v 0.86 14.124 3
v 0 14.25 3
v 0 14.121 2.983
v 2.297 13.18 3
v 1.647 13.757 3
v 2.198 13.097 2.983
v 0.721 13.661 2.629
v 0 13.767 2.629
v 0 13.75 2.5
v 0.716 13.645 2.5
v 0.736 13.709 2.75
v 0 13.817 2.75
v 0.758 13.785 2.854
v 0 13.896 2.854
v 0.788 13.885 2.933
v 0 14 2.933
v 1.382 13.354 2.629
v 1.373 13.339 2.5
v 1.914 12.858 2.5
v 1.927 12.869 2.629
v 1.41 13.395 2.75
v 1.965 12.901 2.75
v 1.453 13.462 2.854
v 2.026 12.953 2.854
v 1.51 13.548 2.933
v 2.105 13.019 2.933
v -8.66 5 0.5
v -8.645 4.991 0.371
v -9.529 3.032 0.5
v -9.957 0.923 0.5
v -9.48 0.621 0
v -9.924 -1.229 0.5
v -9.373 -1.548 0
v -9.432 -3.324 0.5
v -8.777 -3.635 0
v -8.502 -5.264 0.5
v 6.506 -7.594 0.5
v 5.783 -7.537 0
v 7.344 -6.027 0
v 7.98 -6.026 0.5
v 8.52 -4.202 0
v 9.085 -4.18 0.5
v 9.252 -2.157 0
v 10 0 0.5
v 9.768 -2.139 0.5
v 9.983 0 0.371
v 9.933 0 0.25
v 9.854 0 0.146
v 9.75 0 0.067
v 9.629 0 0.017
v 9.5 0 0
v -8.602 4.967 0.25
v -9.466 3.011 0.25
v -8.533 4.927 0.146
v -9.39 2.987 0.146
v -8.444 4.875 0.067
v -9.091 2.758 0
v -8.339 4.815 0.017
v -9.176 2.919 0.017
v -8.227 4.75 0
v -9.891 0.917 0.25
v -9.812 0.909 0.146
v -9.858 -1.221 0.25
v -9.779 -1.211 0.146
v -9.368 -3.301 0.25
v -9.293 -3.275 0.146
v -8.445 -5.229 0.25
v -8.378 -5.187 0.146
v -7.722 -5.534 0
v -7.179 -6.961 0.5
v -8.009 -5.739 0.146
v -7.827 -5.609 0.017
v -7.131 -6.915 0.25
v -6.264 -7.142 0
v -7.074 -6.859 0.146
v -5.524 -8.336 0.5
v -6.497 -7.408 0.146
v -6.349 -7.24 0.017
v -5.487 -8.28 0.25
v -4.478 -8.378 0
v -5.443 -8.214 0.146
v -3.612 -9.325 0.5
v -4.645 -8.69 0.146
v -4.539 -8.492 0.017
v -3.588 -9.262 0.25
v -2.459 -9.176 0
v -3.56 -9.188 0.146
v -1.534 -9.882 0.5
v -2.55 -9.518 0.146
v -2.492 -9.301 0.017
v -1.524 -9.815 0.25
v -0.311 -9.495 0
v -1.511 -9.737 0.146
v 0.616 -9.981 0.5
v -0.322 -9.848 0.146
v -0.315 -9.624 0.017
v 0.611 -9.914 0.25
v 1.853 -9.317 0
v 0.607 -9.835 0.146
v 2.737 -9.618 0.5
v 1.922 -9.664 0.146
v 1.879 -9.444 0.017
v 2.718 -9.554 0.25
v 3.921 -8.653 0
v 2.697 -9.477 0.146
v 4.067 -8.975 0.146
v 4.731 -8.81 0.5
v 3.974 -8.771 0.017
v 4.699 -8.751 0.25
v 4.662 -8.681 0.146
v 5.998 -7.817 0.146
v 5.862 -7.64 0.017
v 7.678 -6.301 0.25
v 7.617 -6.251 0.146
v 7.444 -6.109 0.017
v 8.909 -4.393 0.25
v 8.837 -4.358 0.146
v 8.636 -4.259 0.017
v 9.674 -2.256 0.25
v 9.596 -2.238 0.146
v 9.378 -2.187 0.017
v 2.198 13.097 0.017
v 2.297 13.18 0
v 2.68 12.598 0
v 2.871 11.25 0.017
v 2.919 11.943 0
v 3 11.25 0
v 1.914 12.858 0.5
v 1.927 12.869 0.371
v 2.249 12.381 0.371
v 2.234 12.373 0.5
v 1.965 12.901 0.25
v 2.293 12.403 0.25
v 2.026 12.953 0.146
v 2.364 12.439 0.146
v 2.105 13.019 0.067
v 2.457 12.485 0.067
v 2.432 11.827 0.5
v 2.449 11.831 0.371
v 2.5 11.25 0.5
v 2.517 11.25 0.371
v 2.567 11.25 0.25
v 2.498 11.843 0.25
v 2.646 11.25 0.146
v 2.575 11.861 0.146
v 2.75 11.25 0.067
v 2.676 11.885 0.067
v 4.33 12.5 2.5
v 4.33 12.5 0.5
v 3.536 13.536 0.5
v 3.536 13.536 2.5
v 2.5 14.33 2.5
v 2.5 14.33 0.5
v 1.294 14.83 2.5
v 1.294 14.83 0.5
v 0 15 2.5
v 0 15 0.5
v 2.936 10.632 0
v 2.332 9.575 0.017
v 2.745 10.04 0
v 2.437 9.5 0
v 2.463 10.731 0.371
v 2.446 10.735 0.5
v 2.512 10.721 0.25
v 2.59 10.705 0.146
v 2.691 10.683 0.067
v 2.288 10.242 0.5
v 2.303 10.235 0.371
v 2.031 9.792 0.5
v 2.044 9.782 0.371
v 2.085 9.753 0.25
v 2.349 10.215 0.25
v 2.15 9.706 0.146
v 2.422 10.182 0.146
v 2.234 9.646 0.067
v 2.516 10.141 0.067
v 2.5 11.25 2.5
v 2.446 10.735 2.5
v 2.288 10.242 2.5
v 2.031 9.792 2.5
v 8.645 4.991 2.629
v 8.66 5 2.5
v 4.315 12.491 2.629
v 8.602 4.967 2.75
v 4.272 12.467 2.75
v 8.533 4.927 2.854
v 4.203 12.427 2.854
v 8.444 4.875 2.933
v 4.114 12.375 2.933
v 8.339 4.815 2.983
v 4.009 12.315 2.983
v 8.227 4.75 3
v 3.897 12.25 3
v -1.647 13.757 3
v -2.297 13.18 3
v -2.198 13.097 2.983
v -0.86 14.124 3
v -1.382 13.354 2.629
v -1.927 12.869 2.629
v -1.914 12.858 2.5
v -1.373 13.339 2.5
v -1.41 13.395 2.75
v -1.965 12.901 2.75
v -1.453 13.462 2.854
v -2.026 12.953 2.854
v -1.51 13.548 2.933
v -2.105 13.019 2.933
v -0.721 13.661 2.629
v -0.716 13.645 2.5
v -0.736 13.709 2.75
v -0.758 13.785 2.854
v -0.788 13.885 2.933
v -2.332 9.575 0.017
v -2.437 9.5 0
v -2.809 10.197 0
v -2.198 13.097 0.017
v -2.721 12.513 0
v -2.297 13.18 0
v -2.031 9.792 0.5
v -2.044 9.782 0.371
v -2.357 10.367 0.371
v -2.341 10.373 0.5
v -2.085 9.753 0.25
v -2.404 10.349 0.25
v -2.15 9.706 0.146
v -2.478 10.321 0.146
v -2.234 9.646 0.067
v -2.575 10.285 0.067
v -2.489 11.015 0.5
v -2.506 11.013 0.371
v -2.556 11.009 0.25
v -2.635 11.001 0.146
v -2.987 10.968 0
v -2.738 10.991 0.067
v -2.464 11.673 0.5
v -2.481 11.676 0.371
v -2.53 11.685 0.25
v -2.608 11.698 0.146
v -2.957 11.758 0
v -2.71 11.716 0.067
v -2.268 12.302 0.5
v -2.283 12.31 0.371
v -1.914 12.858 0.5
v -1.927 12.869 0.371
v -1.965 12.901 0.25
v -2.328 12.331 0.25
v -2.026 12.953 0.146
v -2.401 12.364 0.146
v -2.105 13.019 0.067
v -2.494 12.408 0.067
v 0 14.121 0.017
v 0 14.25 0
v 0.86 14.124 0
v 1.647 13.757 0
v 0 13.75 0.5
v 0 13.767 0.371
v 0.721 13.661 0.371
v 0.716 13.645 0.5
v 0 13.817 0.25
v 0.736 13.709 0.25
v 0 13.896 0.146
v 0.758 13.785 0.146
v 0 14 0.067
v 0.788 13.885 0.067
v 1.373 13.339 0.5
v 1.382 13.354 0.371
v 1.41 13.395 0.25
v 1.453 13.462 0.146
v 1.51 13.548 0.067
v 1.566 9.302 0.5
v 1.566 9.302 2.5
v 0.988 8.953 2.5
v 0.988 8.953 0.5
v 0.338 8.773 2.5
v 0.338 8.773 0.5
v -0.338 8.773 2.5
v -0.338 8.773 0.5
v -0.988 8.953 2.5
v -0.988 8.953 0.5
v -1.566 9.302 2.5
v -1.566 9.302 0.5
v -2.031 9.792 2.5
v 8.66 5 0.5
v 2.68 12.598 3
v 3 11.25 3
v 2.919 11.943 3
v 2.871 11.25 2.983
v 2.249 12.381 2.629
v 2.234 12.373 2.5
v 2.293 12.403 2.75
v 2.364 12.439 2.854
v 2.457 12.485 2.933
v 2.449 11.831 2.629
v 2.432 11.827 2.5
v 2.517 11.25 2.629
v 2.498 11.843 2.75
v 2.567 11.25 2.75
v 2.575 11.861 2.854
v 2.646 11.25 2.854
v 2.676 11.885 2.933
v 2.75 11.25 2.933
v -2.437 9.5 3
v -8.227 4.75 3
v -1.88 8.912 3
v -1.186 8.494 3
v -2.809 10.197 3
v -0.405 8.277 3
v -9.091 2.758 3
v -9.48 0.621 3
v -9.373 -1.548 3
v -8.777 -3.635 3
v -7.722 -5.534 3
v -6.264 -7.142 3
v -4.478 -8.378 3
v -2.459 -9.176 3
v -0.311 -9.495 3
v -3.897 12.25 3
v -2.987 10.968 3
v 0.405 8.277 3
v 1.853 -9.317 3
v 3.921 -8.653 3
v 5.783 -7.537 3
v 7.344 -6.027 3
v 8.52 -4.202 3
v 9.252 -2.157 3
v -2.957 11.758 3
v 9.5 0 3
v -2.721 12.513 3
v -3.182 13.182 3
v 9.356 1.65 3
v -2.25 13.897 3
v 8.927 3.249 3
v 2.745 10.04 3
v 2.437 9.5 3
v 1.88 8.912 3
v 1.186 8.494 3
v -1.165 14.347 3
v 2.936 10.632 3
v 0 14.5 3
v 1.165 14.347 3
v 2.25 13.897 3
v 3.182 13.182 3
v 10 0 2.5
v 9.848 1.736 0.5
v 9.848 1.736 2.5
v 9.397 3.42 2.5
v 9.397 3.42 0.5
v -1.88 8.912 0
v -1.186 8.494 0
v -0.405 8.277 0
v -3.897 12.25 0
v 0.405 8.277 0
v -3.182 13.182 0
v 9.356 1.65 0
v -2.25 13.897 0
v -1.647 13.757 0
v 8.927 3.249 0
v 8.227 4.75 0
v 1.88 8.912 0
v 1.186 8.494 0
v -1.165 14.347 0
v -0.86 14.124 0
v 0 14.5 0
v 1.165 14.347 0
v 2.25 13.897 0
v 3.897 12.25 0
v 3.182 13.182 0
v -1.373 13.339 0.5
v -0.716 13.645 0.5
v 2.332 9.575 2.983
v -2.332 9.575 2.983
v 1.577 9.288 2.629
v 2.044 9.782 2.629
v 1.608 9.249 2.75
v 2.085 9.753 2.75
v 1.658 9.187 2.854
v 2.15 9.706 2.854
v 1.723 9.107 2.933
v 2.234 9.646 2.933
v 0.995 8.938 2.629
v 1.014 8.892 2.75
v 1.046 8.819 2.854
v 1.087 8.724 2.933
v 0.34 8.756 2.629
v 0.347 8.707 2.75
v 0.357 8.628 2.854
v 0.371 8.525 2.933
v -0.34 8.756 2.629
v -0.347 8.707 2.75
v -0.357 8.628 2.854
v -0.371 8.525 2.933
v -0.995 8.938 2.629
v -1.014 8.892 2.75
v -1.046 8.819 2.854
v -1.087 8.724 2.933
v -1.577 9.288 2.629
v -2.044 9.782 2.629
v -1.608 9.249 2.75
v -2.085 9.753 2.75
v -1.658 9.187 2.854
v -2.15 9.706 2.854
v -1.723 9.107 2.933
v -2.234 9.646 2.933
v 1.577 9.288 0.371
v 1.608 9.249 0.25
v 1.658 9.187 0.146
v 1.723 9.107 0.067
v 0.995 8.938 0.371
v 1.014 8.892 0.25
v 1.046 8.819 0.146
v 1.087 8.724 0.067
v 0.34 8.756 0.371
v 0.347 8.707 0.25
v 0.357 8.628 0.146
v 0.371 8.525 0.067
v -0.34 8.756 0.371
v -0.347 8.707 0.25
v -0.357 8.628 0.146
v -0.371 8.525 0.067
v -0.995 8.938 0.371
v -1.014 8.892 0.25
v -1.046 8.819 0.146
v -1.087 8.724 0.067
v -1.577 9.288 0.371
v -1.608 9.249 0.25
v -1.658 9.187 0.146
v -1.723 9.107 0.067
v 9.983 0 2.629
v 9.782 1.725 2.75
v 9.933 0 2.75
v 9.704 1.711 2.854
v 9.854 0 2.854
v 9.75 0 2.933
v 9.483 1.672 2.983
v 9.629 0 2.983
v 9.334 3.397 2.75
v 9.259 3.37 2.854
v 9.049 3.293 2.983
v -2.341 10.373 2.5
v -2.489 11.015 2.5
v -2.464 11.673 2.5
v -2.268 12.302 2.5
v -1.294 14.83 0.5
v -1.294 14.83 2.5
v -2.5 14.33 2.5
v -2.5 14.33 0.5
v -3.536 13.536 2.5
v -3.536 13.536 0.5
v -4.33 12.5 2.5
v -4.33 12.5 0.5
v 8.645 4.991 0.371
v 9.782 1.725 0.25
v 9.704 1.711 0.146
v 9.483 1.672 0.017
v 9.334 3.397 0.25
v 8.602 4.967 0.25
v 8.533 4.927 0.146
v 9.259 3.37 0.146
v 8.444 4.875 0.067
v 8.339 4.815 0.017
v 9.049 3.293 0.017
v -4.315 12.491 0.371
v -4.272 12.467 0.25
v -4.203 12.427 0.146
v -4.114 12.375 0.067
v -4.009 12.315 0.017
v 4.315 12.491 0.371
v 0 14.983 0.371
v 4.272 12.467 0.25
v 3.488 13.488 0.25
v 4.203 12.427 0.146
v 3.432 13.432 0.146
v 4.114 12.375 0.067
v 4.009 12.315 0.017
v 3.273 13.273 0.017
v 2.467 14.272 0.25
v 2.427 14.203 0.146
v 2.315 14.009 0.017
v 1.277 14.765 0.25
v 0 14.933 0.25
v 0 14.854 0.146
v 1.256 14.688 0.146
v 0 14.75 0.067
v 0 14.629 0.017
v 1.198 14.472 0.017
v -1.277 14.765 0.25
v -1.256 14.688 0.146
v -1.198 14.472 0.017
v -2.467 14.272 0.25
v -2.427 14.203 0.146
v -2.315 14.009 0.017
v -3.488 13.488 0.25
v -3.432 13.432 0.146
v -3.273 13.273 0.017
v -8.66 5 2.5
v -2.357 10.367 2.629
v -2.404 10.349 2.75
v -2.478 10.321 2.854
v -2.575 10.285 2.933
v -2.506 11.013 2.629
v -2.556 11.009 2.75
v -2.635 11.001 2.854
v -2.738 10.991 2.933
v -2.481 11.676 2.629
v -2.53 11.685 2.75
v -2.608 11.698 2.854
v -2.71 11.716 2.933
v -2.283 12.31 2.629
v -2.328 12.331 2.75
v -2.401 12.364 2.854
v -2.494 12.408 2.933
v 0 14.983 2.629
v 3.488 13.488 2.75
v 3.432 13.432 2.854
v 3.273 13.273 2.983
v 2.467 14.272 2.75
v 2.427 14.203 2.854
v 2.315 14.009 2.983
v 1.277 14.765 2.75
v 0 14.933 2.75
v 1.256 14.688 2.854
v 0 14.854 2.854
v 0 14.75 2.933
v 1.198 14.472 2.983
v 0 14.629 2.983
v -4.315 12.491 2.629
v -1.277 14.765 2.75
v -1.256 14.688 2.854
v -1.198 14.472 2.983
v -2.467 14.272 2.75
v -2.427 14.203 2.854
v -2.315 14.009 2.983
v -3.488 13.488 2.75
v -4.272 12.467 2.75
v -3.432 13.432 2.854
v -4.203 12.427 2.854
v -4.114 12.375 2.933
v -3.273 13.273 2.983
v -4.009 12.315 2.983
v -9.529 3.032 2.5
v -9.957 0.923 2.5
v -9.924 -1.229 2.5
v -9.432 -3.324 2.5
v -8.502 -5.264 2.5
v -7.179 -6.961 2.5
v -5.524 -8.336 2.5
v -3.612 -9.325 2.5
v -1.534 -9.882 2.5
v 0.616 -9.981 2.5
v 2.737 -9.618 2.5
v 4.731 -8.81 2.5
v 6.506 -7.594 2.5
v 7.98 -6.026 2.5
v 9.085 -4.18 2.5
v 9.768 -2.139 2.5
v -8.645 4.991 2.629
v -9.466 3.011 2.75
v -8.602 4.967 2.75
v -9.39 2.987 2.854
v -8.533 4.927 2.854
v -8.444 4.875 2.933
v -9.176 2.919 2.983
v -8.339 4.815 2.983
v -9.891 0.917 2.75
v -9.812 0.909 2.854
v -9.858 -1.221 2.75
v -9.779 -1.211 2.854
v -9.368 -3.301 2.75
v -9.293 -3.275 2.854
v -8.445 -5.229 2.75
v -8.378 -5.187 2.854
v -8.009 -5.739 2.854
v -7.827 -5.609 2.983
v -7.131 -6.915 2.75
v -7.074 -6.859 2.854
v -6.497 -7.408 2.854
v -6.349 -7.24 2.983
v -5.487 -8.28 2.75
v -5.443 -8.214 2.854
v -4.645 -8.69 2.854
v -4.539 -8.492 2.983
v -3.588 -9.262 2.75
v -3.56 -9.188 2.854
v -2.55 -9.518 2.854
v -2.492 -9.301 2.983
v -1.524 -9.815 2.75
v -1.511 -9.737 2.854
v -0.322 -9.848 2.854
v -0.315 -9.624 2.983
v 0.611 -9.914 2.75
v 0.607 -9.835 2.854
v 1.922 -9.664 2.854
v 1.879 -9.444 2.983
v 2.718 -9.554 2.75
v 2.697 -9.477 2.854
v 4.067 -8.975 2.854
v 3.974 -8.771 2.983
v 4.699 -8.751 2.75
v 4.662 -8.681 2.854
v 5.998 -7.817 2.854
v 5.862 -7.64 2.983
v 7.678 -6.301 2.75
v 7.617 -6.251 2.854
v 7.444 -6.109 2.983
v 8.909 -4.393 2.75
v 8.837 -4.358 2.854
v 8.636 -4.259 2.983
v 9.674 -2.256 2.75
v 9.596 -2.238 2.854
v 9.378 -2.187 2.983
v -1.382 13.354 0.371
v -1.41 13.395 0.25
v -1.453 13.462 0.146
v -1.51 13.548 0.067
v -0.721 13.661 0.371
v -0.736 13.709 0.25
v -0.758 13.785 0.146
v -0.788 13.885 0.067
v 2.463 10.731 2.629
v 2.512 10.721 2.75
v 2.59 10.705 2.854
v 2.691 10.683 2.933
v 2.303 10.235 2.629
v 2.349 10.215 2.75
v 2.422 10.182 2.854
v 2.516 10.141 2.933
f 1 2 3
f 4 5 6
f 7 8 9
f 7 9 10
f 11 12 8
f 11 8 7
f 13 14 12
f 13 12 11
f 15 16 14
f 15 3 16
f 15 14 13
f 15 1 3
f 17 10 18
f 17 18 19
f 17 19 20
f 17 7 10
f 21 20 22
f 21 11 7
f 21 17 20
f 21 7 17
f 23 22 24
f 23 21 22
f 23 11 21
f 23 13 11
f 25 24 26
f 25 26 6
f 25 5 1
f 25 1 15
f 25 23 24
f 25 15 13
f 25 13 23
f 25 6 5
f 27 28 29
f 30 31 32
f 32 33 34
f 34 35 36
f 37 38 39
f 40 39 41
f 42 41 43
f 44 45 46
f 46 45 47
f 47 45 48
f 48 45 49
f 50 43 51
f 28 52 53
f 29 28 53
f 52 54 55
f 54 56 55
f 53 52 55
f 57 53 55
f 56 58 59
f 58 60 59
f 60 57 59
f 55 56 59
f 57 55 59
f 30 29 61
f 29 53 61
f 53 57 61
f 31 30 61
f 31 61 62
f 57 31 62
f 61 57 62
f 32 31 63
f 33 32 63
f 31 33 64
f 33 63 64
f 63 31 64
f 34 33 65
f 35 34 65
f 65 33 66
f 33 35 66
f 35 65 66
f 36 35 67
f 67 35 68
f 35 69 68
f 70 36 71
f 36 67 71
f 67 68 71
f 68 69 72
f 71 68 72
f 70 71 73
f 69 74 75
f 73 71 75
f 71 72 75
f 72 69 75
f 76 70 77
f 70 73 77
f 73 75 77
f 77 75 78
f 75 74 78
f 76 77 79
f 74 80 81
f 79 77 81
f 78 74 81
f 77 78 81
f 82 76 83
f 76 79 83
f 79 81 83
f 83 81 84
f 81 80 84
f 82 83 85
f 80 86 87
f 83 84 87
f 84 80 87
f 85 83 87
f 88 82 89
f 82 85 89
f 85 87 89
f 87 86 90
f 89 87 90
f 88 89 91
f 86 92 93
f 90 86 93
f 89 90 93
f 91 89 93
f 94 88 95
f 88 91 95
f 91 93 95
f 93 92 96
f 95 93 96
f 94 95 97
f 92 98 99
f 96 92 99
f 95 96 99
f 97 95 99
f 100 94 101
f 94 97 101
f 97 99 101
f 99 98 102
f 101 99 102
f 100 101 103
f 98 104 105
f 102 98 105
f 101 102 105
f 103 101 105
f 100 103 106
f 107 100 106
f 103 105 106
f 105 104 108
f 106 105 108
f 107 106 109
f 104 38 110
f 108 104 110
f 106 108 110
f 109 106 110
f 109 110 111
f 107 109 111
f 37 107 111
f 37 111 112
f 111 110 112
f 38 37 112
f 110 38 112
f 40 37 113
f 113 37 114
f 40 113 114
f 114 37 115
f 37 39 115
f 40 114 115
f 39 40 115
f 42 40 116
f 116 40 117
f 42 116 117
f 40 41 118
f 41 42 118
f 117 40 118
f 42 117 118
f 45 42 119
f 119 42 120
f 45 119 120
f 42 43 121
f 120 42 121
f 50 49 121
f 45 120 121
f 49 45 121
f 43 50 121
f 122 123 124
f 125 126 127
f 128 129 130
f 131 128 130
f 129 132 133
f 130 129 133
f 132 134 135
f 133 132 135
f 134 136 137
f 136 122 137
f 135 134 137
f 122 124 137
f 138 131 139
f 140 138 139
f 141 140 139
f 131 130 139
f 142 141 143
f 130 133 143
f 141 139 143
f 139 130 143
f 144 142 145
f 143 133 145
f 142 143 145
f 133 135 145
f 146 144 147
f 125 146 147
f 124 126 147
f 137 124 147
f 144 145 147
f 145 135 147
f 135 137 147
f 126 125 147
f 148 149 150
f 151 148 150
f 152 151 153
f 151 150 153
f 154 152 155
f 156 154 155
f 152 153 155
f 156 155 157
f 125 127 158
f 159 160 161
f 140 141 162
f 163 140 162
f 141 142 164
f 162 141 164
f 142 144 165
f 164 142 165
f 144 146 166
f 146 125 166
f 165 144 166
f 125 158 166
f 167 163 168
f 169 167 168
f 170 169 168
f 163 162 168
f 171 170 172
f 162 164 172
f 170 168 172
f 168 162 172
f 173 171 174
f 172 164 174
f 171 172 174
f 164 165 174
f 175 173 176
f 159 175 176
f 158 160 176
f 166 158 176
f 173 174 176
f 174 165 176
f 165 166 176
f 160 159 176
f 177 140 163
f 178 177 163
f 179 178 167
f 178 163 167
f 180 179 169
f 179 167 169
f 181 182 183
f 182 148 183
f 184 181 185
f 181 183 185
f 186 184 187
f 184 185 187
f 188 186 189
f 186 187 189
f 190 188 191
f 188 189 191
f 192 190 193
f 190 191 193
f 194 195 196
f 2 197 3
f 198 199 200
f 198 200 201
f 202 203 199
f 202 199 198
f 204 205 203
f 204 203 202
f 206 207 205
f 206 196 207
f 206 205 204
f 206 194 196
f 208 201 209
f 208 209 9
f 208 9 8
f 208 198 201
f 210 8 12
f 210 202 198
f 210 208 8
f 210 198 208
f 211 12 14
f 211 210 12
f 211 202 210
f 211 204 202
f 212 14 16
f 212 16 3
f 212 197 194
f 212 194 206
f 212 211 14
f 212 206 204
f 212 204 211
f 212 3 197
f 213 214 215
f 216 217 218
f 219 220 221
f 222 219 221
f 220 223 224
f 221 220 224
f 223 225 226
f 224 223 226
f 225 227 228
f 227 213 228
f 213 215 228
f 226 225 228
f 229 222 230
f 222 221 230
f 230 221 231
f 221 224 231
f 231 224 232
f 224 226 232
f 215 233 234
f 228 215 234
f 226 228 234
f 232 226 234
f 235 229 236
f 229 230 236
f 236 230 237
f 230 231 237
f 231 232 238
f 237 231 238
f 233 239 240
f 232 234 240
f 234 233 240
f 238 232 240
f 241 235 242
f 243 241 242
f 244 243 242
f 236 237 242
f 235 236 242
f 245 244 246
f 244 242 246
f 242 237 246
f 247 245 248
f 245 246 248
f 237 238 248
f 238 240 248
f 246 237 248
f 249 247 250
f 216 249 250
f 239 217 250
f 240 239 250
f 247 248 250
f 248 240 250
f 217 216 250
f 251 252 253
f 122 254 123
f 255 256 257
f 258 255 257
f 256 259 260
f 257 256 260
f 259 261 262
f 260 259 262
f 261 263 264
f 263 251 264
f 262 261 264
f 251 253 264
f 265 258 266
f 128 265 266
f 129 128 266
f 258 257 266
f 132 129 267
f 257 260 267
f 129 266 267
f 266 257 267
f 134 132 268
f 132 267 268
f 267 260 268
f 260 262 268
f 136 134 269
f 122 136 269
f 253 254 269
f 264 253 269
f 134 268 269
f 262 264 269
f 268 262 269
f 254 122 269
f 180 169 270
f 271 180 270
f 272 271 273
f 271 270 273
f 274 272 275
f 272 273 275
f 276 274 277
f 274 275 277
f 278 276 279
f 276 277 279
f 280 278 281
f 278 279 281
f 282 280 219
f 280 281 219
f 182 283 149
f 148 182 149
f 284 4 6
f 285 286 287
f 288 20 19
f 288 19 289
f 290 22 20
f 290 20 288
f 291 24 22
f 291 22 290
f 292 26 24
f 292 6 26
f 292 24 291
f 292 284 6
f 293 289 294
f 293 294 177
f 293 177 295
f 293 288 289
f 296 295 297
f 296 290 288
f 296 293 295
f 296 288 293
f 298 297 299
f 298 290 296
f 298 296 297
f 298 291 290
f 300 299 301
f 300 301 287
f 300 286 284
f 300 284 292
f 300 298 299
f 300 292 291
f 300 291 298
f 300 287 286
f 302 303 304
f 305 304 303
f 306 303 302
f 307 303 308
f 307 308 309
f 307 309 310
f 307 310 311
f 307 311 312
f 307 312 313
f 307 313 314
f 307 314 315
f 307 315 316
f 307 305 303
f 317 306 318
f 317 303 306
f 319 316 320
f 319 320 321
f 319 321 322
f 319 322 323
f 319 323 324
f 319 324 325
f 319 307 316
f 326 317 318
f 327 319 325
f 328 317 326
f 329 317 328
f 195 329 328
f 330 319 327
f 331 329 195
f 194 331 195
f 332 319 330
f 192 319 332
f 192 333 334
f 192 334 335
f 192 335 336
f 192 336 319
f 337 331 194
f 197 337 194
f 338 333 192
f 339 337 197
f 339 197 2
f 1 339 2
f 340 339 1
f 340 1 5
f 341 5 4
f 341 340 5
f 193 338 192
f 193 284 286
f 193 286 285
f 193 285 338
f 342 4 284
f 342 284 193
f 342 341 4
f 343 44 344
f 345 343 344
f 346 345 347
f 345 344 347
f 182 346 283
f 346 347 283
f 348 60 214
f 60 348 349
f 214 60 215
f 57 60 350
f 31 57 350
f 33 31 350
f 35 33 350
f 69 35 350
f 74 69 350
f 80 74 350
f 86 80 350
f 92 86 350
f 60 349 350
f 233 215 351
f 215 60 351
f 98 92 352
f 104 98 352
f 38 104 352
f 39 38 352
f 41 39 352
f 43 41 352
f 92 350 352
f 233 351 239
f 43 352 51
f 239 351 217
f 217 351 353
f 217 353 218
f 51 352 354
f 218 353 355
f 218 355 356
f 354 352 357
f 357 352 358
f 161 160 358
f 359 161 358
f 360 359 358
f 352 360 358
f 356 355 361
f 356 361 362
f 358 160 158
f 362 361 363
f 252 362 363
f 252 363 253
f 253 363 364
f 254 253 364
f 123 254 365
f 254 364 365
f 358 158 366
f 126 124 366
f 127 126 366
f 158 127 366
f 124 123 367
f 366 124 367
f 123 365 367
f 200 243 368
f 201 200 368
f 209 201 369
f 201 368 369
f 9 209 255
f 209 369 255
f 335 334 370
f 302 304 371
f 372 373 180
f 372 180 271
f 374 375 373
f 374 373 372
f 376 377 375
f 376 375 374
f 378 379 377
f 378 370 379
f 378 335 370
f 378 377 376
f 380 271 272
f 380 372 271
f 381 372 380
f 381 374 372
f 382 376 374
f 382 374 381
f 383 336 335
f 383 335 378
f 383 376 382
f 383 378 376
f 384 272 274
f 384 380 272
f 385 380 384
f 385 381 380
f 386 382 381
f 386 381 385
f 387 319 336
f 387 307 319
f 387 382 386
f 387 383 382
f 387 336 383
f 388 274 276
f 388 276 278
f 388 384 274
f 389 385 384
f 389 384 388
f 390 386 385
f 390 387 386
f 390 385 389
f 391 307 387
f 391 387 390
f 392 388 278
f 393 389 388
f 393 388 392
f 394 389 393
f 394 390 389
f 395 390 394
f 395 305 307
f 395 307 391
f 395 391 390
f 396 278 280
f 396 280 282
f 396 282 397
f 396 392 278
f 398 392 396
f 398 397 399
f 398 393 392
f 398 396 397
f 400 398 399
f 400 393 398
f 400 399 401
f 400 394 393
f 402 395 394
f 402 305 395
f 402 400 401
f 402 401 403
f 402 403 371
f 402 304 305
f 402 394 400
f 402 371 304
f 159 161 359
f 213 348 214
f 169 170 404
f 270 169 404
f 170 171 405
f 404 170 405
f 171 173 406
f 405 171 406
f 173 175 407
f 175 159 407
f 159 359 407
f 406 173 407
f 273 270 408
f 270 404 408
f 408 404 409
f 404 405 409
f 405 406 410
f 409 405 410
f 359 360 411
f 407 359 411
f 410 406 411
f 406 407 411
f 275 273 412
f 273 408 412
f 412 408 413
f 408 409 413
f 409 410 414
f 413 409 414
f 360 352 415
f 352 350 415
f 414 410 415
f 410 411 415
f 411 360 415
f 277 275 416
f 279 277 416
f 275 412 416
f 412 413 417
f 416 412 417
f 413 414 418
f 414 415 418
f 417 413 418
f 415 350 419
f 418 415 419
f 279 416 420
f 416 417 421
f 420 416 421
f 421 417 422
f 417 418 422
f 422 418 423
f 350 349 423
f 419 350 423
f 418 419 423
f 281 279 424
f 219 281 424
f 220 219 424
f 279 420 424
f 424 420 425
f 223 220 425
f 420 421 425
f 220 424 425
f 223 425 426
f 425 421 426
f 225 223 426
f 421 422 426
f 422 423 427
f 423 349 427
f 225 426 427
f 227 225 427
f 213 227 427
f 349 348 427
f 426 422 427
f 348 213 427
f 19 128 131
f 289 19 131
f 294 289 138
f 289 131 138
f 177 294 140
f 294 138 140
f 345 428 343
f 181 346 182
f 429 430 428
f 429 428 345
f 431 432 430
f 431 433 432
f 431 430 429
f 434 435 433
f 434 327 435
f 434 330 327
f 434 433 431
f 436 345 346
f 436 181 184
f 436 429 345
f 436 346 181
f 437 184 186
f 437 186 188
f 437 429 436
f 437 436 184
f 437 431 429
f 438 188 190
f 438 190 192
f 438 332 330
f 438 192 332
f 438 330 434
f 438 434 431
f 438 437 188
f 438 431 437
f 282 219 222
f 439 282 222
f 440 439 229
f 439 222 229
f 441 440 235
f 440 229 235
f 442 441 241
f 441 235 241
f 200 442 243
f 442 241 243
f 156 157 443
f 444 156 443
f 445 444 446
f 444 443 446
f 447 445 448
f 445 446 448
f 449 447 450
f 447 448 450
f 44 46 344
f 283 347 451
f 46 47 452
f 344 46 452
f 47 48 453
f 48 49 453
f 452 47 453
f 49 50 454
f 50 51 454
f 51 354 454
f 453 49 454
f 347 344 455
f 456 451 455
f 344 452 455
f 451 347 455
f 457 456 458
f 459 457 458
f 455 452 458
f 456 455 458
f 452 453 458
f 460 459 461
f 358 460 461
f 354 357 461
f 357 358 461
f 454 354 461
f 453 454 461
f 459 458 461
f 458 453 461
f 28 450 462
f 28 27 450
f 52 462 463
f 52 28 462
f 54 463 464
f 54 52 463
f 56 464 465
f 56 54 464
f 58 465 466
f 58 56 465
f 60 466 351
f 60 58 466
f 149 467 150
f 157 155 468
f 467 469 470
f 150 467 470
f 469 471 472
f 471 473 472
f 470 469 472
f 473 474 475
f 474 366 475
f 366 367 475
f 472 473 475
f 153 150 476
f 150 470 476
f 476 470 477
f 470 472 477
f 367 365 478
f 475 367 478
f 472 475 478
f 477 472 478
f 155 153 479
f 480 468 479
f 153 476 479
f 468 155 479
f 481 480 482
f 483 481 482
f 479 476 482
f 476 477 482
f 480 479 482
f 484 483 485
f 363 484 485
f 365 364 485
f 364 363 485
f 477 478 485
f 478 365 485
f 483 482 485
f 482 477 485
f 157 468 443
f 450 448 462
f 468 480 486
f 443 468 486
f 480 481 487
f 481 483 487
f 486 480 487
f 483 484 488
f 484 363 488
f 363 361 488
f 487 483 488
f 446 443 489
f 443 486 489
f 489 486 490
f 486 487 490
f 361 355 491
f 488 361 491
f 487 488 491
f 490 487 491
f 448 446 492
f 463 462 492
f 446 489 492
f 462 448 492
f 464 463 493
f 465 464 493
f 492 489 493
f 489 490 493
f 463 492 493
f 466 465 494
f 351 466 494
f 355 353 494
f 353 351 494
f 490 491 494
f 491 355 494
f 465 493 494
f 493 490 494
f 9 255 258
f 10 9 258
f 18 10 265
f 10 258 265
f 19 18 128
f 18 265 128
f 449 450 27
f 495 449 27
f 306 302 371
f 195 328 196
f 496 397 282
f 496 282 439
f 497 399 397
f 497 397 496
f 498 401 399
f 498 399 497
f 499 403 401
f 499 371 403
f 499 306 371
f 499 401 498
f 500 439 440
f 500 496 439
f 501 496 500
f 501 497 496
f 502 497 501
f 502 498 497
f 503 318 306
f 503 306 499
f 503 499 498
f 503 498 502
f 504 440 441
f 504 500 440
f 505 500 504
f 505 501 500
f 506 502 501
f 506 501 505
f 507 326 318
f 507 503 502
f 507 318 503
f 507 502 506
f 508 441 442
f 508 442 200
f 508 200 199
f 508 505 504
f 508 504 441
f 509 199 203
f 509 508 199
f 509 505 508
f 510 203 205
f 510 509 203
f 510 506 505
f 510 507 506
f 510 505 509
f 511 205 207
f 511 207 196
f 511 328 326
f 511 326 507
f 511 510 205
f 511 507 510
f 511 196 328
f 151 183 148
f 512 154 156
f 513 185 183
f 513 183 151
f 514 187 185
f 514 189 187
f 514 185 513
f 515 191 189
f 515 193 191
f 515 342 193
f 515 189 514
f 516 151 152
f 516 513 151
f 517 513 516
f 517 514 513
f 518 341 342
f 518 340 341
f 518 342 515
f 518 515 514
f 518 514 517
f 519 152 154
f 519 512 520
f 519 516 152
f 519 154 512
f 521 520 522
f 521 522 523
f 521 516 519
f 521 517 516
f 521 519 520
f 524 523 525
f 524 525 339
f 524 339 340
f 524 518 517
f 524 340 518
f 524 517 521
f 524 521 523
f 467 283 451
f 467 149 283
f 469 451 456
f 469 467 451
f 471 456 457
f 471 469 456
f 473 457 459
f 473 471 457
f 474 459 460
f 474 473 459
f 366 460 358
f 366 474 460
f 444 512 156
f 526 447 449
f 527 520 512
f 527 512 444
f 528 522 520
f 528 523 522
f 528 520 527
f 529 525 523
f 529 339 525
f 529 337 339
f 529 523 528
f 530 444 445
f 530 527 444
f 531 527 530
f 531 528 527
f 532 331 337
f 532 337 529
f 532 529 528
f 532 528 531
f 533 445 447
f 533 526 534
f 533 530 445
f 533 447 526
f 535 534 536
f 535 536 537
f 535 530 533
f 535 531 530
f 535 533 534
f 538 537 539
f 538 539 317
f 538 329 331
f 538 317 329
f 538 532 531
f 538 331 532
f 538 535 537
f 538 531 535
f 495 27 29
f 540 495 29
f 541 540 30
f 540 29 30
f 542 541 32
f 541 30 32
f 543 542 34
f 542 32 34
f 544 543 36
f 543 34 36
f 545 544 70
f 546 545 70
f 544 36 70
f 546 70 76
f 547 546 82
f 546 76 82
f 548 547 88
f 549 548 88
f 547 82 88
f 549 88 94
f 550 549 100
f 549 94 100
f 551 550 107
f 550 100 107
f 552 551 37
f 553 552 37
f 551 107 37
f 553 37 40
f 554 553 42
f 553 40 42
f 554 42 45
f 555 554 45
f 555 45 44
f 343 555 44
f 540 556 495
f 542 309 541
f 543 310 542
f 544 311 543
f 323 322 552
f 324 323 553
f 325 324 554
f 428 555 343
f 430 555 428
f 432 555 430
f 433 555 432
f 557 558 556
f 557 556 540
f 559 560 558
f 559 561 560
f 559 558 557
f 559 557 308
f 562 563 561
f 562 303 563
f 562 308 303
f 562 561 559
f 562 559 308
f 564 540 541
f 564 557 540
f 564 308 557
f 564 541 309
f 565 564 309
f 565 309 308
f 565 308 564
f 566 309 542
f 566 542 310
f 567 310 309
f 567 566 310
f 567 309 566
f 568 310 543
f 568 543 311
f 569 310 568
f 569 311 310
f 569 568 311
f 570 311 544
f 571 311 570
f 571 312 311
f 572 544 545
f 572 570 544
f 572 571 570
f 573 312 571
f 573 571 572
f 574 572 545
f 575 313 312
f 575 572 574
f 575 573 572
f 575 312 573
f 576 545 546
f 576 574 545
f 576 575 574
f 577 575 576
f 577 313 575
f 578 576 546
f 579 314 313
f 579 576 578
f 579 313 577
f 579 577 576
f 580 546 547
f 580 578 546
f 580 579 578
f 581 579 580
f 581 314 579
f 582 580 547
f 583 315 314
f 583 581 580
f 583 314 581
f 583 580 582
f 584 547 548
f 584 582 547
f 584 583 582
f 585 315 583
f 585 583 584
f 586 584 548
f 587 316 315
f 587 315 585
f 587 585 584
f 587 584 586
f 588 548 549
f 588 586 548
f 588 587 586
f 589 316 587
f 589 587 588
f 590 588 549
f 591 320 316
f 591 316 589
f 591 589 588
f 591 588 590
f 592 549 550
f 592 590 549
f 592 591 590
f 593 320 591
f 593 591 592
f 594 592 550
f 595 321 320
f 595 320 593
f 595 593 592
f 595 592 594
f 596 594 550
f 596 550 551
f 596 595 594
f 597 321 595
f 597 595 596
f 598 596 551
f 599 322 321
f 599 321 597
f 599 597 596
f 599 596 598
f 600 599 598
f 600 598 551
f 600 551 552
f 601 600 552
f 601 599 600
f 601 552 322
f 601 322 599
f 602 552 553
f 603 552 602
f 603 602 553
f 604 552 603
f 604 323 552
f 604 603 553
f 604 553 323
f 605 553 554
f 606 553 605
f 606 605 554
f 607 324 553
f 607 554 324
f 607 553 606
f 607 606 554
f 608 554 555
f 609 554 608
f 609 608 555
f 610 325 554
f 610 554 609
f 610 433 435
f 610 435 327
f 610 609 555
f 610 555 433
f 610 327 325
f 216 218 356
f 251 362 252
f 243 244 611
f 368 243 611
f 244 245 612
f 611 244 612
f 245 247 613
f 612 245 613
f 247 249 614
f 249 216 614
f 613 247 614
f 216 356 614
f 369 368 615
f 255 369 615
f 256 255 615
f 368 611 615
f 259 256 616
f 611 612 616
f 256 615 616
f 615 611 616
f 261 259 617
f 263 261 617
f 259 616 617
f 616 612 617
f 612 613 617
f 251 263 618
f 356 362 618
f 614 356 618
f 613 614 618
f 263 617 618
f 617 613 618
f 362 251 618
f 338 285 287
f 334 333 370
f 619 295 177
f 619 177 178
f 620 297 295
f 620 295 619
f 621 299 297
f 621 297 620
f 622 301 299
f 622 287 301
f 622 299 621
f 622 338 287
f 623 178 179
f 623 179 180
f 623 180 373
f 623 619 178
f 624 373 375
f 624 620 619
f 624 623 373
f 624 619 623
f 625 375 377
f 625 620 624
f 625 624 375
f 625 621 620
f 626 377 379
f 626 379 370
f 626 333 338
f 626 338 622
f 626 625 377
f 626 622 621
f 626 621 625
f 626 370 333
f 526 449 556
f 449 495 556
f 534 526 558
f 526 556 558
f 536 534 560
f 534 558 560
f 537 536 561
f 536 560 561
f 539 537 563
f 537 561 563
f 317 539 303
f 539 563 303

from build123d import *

# Parameters (mm, degrees)
F1_DEPTH = 3
F2_R     = 0.5


with BuildPart() as f1:
    # F0 (on Top) → F1 (new body)
    with BuildSketch(Plane.XY):
        with BuildLine():
            ThreePointArc((-8.6602540378, 5), (-2.588190451, -9.6592582629), (10, 0))
            ThreePointArc((10, 0), (9.6592582629, 2.588190451), (8.6602540378, 5))
            ThreePointArc((8.6602540378, 5), (7.0062926922, 7.1352549156), (4.8412291828, 8.75))
            ThreePointArc((4.8412291828, 8.75), (0, 5), (-4.8412291828, 8.75))
            ThreePointArc((-4.8412291828, 8.75), (-7.0062926922, 7.1352549156), (-8.6602540378, 5))
        make_face()
        with BuildLine():
            Line((-4.3301270189, 12.5), (-8.6602540378, 5))
            ThreePointArc((-8.6602540378, 5), (-7.0062926922, 7.1352549156), (-4.8412291828, 8.75))
            ThreePointArc((-4.8412291828, 8.75), (-4.9541970736, 10.6752268918), (-4.3301270189, 12.5))
        make_face()
        with BuildLine():
            ThreePointArc((-4.8412291828, 8.75), (0, 5), (4.8412291828, 8.75))
            ThreePointArc((4.8412291828, 8.75), (3.4751568493, 9.3767416981), (2.0305821552, 9.7916666667))
            ThreePointArc((2.0305821552, 9.7916666667), (0, 8.75), (-2.0305821552, 9.7916666667))
            ThreePointArc((-2.0305821552, 9.7916666667), (-3.4751568493, 9.3767416981), (-4.8412291828, 8.75))
        make_face()
        with BuildLine():
            ThreePointArc((2.0305821552, 9.7916666667), (3.4751568493, 9.3767416981), (4.8412291828, 8.75))
            ThreePointArc((4.8412291828, 8.75), (4.9601484813, 9.3699785376), (5, 10))
            ThreePointArc((5, 10), (4.8296291314, 11.2940952255), (4.3301270189, 12.5))
            ThreePointArc((4.3301270189, 12.5), (2.5, 14.3301270189), (0, 15))
            Line((0, 15), (0, 13.75))
            ThreePointArc((0, 13.75), (1.0557382883, 13.5161457735), (1.9139654879, 12.8583333333))
            ThreePointArc((1.9139654879, 12.8583333333), (2.3489267464, 12.1058873408), (2.5, 11.25))
            ThreePointArc((2.5, 11.25), (2.3797537045, 10.4839893564), (2.0305821552, 9.7916666667))
        make_face()
        with BuildLine():
            ThreePointArc((4.8412291828, 8.75), (7.0062926922, 7.1352549156), (8.6602540378, 5))
            Line((8.6602540378, 5), (4.3301270189, 12.5))
            ThreePointArc((4.3301270189, 12.5), (4.8296291314, 11.2940952255), (5, 10))
            ThreePointArc((5, 10), (4.9601484813, 9.3699785376), (4.8412291828, 8.75))
        make_face()
        with BuildLine():
            ThreePointArc((-4.3301270189, 12.5), (-4.9541970736, 10.6752268918), (-4.8412291828, 8.75))
            ThreePointArc((-4.8412291828, 8.75), (-3.4751568493, 9.3767416981), (-2.0305821552, 9.7916666667))
            ThreePointArc((-2.0305821552, 9.7916666667), (-2.4981943756, 11.3449992725), (-1.9139654879, 12.8583333333))
            ThreePointArc((-1.9139654879, 12.8583333333), (-1.0557382883, 13.5161457735), (0, 13.75))
            Line((0, 13.75), (0, 15))
            ThreePointArc((0, 15), (-2.5, 14.3301270189), (-4.3301270189, 12.5))
        make_face()
    extrude(amount=F1_DEPTH)

    # F2
    f2_edges = [f1.edges().sort_by_distance(p)[0] for p in [
        (6.495191, 8.75, 3),
        (0, 15, 3),
        (0, 15, 0),
        (6.495191, 8.75, 0),
        (0, -10, 0),
        (0, -10, 3),
        (-6.495191, 8.75, 3),
        (2.030582, 12.708333, 3),
        (2.030582, 12.708333, 0),
        (-6.495191, 8.75, 0),
    ]]
    fillet(f2_edges, radius=F2_R)


solid = f1.part
